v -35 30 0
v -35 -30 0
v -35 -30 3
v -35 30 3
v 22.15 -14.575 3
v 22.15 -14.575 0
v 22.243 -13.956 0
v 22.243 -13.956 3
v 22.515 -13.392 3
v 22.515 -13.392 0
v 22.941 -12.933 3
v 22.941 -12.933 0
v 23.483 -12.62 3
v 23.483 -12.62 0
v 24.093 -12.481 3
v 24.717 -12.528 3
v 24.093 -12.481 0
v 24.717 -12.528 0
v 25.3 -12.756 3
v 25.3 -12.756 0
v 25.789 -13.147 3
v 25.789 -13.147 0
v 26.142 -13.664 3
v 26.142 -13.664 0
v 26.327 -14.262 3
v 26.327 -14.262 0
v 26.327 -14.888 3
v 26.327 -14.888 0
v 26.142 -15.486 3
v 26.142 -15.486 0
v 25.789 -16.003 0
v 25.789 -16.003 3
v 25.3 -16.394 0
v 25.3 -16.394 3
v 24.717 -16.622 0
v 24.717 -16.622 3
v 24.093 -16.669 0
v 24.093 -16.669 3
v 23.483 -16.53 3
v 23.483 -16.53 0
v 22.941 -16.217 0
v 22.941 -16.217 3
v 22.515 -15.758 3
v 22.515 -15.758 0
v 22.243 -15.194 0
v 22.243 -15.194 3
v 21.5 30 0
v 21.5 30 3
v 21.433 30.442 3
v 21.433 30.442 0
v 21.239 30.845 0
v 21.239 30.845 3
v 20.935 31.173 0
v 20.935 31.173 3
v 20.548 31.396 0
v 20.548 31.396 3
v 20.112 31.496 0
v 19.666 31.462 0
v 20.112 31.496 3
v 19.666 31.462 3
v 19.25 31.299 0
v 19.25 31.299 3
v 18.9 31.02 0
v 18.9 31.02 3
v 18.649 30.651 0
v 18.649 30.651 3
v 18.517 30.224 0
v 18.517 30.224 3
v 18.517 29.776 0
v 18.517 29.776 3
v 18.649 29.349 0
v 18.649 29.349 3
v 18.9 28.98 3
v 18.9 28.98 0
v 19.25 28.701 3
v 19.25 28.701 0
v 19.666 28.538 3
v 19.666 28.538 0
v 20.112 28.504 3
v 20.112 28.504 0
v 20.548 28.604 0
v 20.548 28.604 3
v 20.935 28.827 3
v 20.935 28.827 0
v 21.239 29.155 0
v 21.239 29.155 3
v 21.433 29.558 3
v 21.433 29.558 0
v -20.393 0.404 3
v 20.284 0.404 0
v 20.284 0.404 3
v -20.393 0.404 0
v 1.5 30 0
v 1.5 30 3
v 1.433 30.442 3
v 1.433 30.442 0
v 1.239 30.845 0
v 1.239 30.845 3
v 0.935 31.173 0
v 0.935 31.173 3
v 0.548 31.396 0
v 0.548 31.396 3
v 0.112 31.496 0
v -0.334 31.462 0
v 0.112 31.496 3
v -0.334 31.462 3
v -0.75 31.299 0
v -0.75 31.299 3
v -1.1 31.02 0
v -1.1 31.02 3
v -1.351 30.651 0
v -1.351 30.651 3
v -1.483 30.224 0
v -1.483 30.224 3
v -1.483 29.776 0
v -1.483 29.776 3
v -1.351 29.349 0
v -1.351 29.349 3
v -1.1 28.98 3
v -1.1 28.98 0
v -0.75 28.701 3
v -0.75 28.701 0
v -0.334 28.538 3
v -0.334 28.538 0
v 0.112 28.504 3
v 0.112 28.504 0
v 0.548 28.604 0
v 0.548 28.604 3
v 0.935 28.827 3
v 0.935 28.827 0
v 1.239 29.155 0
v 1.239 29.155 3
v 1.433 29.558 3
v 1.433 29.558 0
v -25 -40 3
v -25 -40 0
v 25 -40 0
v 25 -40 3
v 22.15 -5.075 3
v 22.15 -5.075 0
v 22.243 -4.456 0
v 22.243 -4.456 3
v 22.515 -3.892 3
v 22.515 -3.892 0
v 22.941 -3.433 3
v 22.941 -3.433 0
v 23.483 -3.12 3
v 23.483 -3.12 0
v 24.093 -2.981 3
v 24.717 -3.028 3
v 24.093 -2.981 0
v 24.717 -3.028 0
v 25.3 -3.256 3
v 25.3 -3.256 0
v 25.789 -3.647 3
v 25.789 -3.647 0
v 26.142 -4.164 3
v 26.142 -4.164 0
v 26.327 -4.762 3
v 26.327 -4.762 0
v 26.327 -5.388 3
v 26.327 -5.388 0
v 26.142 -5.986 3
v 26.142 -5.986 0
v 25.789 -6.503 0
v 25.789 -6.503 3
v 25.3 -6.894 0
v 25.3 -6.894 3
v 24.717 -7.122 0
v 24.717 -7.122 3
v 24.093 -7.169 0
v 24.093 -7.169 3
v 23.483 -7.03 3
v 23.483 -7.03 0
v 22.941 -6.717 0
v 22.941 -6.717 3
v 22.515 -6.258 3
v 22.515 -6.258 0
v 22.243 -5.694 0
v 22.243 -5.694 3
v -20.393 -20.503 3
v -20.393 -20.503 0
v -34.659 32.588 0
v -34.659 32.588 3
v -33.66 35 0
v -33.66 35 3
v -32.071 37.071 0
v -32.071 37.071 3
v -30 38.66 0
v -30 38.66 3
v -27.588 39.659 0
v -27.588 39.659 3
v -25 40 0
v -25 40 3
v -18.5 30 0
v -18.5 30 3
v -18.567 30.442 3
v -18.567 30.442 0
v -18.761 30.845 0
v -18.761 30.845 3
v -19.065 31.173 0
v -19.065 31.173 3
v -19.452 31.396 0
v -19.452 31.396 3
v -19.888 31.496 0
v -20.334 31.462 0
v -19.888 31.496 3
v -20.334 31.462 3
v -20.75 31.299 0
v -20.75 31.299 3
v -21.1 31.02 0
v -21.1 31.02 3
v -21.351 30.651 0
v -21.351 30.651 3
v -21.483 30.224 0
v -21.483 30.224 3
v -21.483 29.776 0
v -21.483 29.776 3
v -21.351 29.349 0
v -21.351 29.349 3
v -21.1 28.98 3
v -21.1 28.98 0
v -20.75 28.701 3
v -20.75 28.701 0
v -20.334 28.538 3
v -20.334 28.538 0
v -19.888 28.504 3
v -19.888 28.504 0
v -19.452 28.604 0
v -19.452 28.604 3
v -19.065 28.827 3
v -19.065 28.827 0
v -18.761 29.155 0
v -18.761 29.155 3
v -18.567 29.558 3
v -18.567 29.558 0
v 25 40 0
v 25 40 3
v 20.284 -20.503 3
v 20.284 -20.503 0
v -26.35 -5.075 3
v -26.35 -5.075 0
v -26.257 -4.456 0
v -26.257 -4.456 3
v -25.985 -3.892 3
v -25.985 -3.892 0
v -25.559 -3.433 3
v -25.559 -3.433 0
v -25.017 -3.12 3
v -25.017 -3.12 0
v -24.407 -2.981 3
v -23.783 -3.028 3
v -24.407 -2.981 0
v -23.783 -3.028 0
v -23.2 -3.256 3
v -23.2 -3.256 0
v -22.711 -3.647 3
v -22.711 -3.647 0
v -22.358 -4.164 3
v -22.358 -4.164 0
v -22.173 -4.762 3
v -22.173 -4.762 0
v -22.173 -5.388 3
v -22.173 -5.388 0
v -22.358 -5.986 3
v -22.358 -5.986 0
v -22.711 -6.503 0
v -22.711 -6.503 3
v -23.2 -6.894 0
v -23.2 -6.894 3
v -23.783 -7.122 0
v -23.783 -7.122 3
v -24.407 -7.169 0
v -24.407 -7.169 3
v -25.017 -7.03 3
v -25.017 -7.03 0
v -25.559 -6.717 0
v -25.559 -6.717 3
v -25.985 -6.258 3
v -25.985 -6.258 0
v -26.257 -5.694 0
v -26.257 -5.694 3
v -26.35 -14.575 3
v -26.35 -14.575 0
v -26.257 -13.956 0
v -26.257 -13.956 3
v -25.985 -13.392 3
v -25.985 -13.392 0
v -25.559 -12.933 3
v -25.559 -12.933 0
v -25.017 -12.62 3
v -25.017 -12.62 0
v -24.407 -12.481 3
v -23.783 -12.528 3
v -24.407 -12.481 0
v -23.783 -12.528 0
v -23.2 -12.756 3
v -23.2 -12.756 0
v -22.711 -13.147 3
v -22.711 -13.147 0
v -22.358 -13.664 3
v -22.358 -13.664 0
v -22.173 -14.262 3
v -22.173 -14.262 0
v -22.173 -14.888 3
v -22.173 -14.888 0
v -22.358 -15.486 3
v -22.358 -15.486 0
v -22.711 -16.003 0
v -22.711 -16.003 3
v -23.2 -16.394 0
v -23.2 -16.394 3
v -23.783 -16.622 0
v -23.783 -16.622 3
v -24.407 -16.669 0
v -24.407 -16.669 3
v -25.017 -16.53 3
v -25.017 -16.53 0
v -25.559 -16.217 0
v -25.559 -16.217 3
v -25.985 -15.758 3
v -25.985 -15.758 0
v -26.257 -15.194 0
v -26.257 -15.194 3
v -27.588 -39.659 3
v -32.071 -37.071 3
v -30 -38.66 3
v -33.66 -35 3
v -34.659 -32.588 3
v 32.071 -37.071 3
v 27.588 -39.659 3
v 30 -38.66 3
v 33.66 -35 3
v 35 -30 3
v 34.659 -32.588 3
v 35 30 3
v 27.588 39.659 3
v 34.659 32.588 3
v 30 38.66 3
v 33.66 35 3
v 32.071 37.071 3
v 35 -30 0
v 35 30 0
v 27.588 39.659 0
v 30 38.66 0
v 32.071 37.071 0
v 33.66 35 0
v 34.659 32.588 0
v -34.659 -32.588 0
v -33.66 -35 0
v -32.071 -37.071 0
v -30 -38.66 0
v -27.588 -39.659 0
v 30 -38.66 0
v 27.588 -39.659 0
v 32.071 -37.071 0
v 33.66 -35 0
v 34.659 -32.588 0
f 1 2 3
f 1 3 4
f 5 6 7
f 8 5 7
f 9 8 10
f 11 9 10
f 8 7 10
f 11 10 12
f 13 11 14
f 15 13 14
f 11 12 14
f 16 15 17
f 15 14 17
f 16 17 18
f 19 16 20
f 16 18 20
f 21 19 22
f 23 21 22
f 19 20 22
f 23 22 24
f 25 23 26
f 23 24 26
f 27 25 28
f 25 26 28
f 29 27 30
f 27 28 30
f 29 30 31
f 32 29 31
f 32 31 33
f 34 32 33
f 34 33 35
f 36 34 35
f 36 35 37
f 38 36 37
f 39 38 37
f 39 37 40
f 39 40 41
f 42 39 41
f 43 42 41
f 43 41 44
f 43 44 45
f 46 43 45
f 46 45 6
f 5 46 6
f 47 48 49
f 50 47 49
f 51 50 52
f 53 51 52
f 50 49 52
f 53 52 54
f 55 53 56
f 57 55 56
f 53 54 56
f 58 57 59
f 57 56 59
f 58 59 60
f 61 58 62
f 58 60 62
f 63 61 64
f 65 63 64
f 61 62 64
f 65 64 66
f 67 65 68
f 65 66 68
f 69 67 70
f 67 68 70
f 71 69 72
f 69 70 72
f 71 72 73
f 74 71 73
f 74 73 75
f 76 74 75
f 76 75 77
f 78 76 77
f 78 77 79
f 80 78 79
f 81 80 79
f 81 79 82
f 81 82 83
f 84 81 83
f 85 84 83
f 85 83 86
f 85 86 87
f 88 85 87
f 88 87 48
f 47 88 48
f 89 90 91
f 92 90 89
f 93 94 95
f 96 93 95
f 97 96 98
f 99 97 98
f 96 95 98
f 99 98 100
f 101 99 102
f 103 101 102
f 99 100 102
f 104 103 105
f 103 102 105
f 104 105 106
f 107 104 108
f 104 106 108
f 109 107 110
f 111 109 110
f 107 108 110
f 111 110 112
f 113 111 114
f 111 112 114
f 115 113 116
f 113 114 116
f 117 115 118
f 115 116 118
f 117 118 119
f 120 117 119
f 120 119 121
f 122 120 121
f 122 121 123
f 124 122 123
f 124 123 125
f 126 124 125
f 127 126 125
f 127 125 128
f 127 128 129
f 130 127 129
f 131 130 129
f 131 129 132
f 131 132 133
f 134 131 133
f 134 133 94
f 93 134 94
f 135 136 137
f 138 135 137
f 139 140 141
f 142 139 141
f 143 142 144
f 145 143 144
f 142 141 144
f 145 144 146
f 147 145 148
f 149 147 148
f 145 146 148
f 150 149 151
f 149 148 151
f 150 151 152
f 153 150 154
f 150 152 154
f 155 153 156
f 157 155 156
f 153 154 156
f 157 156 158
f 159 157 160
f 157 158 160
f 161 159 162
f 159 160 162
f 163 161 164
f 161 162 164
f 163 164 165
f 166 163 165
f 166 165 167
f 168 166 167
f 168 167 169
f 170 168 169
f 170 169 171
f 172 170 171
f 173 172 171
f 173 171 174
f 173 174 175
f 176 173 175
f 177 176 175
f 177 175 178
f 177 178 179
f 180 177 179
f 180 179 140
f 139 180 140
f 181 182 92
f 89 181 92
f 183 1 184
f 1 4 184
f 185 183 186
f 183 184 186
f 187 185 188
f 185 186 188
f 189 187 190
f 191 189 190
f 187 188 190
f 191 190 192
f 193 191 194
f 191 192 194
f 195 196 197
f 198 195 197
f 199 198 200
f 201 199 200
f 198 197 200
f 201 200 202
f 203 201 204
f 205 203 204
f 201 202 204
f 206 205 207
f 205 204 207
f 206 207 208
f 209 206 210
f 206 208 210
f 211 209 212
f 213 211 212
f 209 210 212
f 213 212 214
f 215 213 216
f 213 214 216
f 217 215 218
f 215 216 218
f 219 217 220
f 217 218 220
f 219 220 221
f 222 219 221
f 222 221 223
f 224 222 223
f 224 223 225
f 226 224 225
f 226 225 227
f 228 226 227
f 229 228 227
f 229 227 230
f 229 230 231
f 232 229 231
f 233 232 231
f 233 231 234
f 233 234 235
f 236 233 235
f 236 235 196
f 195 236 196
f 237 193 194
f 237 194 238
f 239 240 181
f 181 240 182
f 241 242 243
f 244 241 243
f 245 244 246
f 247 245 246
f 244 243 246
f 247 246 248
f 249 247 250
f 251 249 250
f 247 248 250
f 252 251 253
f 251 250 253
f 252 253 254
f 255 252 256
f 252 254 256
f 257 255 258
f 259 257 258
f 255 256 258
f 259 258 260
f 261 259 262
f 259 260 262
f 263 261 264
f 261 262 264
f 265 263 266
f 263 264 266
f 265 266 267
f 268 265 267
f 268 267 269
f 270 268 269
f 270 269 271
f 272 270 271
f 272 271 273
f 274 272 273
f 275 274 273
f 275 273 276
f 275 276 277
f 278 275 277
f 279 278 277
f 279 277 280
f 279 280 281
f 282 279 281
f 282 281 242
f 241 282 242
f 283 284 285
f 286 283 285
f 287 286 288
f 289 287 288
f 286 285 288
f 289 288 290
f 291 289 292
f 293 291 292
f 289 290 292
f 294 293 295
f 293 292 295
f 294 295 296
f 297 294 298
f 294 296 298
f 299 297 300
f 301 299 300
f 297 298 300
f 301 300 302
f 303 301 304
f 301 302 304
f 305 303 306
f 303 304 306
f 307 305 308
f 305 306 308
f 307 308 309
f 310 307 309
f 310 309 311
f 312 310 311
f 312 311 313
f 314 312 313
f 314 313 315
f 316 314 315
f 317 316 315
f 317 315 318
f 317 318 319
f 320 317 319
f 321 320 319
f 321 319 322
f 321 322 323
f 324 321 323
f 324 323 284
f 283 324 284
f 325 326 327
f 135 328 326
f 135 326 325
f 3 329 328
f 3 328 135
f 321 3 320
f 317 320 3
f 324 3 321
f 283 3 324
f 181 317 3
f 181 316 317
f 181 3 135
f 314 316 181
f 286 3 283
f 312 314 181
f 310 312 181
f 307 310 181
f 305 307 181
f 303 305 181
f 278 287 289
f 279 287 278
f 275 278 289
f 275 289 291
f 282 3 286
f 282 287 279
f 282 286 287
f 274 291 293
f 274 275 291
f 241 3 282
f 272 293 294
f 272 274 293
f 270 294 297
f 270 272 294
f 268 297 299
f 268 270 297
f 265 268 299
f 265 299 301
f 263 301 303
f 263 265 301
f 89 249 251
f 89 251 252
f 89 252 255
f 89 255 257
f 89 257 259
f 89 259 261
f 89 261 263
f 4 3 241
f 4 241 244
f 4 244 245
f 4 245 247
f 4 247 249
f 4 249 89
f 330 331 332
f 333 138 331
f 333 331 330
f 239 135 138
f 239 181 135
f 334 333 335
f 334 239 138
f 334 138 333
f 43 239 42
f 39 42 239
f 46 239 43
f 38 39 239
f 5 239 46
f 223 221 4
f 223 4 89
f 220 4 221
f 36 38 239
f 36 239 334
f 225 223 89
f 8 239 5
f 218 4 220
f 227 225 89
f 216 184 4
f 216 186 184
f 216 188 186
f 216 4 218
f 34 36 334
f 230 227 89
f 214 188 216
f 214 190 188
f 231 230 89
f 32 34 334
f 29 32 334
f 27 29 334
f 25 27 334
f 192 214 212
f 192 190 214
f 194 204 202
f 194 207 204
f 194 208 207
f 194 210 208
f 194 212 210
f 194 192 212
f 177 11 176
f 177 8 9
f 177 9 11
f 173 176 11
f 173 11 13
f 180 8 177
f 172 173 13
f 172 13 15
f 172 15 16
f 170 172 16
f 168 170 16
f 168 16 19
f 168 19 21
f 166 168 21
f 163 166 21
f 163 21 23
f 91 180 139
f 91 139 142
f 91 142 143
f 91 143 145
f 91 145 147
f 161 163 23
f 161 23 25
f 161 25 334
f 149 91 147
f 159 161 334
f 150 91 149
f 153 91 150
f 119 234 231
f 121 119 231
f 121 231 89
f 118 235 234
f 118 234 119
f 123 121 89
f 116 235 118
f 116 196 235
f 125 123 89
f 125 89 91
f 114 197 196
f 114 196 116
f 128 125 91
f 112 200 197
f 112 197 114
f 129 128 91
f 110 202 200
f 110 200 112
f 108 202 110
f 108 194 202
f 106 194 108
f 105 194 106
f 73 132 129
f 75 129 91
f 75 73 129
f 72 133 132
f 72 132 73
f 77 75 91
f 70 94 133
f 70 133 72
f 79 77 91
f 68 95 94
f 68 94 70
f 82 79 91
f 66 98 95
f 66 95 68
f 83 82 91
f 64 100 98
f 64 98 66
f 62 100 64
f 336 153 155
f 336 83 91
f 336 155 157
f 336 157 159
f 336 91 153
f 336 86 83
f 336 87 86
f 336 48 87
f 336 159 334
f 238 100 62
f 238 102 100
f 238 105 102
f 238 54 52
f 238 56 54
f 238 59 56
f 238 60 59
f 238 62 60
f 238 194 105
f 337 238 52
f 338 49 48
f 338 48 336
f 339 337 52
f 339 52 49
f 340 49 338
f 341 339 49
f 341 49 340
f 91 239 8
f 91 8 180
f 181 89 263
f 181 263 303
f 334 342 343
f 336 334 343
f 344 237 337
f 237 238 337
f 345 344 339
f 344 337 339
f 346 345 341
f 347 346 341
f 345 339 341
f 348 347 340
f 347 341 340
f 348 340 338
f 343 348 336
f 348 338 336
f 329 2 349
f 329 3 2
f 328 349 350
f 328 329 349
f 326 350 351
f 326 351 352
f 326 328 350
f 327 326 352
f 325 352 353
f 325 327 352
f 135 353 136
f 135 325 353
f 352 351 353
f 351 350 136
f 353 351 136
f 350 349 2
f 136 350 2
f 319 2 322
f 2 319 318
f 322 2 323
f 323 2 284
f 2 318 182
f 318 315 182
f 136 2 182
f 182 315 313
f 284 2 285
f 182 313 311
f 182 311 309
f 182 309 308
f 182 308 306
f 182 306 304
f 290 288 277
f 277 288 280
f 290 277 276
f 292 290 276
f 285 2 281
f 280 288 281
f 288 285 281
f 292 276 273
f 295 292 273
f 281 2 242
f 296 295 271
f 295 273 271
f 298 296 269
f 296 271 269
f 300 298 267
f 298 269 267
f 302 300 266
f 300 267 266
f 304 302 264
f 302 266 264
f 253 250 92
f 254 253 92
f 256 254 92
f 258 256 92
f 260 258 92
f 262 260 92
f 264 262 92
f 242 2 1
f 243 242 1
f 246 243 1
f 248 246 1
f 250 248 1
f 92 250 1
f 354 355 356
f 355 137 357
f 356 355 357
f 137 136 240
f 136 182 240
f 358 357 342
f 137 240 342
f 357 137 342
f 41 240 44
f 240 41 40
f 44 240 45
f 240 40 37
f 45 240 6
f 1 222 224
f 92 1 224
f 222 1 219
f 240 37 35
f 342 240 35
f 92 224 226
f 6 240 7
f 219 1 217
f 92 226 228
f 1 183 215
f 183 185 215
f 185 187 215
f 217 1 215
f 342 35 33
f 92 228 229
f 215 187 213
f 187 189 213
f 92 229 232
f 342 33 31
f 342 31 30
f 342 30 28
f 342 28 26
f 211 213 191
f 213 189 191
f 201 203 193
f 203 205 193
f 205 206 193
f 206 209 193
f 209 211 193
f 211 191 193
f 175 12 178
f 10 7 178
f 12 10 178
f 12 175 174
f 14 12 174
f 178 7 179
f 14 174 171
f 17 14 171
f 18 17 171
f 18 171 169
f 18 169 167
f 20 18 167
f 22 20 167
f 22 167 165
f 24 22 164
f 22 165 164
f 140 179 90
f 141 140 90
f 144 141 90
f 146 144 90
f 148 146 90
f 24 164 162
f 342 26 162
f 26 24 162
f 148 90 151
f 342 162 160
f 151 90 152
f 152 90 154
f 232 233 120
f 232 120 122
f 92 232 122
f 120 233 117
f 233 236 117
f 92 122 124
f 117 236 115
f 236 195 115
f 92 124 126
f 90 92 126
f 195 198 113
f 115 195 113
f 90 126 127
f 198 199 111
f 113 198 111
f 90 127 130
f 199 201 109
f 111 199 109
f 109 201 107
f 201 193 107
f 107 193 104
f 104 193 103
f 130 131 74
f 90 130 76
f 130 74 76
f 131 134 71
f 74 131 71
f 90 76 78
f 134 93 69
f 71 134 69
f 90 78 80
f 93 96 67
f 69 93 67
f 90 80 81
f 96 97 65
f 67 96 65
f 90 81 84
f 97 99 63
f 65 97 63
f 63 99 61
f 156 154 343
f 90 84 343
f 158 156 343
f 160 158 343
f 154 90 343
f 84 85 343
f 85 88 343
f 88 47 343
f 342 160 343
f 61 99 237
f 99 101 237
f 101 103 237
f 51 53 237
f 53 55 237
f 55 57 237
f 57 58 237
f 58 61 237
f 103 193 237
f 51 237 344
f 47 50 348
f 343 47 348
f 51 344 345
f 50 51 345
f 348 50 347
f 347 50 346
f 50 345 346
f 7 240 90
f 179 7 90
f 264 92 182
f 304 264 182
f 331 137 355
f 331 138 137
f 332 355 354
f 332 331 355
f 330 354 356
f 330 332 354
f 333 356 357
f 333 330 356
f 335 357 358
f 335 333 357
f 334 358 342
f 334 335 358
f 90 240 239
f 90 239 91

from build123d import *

# Parameters (mm, degrees)
SKETCH_1_W          = 70
SKETCH_1_H          = 80
EXTRUDE_1_DEPTH     = 3
SKETCH_4_R          = 2.1
SKETCH_4_W          = 40.676852231
SKETCH_4_H          = 20.906984827
CUT_EXTRUDE_3_DEPTH = 10
SKETCH_5_R          = 1.5
CUT_EXTRUDE_4_DEPTH = 10
FILLET_1_R          = 10


with BuildPart() as part:
    # 草图1 → 凸台-拉伸1 (new body)
    with BuildSketch(Plane.XY):
        Rectangle(SKETCH_1_W, SKETCH_1_H)
    extrude(amount=EXTRUDE_1_DEPTH)

    # 草图4 → 切除-拉伸3 (cut)
    with BuildSketch(Plane(origin=(0, 0, 0), x_dir=(-1, 0, 0), z_dir=(0, 0, -1))):
        with Locations((24.25, -14.575)):
            Circle(SKETCH_4_R)
        with Locations((24.25, -5.075)):
            Circle(SKETCH_4_R)
        with Locations((-24.25, -14.575)):
            Circle(SKETCH_4_R)
        with Locations((-24.25, -5.075)):
            Circle(SKETCH_4_R)
        with Locations((0.054839574, -10.049357678)):
            Rectangle(SKETCH_4_W, SKETCH_4_H)
    extrude(amount=-CUT_EXTRUDE_3_DEPTH, mode=Mode.SUBTRACT)

    # 草图5 → 切除-拉伸4 (cut)
    with BuildSketch(Plane.XY.offset(3)):
        with Locations((-20, 30)):
            Circle(SKETCH_5_R)
        with Locations((0, 30)):
            Circle(SKETCH_5_R)
        with Locations((20, 30)):
            Circle(SKETCH_5_R)
    extrude(amount=-CUT_EXTRUDE_4_DEPTH, mode=Mode.SUBTRACT)

    # 圆角1
    fillet_1_edges = [part.edges().sort_by_distance(p)[0] for p in [
        (35, -40, 1.5),
        (-35, -40, 1.5),
        (-35, 40, 1.5),
        (35, 40, 1.5),
    ]]
    fillet(fillet_1_edges, radius=FILLET_1_R)


solid = part.part
